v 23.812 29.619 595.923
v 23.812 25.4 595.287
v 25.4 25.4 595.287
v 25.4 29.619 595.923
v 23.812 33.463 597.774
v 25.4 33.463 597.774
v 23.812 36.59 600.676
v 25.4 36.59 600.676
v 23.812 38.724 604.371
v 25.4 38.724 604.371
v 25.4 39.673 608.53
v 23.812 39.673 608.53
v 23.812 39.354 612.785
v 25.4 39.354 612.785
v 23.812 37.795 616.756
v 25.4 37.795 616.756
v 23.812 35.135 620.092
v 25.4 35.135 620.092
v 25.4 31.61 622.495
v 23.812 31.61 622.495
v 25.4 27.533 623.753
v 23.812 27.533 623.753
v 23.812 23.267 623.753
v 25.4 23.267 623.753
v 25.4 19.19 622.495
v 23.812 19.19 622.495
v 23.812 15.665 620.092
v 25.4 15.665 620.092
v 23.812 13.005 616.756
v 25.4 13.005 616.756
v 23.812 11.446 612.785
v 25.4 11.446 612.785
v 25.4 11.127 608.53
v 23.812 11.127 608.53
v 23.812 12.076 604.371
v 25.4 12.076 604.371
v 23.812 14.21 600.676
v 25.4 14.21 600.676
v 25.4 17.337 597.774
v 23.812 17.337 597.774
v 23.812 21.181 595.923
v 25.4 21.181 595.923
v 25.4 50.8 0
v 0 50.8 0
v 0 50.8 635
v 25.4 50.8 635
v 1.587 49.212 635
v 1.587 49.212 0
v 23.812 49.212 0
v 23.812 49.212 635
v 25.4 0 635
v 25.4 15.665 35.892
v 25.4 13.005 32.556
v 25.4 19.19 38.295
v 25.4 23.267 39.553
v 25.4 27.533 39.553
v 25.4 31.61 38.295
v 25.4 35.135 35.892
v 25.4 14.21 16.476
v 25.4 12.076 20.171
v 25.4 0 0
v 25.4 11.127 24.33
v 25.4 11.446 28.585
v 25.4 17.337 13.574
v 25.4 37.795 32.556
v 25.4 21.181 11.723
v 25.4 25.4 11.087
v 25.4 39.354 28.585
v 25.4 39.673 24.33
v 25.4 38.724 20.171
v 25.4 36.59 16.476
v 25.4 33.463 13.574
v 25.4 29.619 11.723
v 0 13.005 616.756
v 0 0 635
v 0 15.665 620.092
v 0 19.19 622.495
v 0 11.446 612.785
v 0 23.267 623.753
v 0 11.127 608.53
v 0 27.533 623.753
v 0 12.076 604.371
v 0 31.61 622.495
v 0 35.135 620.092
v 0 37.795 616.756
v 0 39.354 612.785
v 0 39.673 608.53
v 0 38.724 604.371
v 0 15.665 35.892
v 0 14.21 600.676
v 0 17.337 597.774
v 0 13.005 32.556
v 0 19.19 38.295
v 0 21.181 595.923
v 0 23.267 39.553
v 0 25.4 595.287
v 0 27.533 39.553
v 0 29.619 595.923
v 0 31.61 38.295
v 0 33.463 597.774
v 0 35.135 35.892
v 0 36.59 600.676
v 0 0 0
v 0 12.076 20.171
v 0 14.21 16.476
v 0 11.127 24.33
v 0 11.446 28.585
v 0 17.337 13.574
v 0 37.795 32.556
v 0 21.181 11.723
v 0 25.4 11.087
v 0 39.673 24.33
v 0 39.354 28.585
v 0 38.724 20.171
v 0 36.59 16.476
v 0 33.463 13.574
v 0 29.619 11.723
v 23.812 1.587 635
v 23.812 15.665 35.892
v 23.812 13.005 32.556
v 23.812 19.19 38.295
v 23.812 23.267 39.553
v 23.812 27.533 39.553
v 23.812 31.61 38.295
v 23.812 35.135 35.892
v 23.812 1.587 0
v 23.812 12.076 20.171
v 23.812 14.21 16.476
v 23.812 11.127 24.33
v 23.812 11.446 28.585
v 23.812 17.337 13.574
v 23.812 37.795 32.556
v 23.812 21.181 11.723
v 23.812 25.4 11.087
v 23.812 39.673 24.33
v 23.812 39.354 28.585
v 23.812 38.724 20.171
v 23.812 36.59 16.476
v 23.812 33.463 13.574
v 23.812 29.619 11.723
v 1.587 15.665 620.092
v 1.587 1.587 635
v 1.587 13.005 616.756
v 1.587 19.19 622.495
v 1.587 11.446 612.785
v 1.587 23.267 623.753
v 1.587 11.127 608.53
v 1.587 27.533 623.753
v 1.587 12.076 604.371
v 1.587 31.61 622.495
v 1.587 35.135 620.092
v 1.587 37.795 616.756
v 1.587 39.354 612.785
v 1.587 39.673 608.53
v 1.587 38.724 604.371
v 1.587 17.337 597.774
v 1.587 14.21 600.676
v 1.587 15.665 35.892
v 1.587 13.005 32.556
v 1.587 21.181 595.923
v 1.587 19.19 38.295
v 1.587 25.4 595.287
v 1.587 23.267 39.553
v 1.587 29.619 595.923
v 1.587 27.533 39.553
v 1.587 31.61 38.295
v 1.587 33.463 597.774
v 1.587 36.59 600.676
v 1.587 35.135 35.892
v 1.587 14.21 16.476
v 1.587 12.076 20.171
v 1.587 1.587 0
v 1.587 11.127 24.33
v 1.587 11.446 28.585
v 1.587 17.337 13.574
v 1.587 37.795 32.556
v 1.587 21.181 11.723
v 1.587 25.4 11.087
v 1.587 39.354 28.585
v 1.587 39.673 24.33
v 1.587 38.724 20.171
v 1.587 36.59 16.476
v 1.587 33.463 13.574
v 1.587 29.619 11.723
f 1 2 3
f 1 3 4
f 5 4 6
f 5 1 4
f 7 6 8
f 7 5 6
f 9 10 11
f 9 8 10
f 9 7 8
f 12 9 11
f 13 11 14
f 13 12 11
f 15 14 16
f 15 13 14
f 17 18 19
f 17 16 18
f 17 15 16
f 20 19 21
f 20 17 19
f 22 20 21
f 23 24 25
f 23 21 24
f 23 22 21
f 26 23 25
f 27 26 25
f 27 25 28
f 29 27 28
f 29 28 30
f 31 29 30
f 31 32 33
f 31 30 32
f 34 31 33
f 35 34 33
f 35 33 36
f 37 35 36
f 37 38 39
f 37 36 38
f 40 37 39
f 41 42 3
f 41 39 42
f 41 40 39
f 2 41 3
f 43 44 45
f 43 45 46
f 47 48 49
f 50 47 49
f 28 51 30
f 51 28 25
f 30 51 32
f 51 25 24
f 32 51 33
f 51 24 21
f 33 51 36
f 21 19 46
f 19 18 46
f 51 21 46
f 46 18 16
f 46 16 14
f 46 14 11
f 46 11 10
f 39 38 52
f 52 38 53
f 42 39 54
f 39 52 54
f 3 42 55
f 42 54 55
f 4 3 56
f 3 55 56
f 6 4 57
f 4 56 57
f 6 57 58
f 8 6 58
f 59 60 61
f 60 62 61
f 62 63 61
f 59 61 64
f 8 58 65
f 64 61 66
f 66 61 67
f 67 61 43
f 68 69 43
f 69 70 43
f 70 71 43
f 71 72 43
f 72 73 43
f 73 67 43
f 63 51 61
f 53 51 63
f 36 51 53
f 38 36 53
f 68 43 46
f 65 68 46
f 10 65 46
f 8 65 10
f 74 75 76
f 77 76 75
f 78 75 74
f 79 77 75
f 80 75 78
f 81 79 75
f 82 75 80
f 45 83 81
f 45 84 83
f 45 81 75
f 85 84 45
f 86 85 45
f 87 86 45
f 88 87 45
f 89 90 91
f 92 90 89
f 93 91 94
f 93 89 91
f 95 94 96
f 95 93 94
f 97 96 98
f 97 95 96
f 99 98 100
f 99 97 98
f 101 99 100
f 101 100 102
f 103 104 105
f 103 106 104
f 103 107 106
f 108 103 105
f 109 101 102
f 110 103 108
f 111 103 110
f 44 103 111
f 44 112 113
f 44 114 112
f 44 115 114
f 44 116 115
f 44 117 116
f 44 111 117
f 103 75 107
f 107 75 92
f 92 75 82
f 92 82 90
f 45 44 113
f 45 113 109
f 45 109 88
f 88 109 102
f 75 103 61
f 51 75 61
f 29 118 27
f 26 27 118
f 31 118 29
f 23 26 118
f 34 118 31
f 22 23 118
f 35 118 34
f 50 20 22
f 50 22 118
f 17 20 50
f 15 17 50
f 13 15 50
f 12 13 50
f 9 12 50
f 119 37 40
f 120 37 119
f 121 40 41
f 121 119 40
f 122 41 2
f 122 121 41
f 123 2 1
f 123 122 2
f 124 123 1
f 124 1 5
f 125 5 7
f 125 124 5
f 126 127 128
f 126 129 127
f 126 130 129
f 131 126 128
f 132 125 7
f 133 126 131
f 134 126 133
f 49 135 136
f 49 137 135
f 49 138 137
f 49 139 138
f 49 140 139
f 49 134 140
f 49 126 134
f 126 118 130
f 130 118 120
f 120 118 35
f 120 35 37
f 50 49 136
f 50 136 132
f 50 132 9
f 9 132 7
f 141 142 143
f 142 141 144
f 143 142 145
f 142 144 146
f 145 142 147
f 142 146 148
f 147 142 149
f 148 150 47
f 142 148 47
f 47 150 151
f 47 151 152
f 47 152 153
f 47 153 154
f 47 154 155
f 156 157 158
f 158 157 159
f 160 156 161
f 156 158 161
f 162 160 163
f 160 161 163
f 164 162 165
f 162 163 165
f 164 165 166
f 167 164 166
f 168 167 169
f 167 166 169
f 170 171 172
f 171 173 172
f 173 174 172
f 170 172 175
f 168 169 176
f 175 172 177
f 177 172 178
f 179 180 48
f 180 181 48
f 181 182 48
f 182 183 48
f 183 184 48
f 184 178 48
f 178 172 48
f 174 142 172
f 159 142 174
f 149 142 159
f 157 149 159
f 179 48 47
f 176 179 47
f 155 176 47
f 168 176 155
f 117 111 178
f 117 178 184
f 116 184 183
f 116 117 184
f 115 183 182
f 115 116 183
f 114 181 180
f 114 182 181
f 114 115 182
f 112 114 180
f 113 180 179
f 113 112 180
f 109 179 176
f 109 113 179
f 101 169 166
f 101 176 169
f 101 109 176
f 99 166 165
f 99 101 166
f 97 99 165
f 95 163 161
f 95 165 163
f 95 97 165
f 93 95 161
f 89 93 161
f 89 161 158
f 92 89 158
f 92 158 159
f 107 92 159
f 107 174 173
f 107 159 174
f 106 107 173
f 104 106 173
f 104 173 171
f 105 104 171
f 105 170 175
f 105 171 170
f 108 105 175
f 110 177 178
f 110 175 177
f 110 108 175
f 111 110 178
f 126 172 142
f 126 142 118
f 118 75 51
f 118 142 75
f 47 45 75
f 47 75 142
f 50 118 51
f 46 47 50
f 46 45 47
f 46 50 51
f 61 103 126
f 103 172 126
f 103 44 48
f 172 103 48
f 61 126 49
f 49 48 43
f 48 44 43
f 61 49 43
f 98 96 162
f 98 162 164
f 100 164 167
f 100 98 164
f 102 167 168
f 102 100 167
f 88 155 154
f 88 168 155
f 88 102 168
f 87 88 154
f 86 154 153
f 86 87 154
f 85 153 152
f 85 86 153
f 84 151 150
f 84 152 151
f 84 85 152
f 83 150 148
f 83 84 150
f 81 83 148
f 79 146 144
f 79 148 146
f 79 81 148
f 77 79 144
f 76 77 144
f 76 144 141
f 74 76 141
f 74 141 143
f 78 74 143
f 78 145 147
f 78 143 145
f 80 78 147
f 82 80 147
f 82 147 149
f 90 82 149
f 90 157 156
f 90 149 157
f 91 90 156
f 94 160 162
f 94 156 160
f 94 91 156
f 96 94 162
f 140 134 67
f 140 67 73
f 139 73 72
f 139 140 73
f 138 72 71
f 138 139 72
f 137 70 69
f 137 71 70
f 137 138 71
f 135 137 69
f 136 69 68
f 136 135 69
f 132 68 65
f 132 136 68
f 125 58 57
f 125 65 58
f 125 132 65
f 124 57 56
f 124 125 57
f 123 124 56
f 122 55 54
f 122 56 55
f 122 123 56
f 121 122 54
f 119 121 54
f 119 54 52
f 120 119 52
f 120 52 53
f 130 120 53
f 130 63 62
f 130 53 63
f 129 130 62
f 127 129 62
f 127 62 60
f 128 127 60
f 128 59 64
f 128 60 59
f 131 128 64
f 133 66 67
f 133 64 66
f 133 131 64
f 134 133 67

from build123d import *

# Parameters (mm, degrees)
SKETCH1_W               = 25.4
SKETCH1_H               = 50.8
SKETCH1_W_2             = 22.225
SKETCH1_H_2             = 47.625
BOSS_EXTRUDE1_DEPTH     = 635
CUT_EXTRUDE1_DEPTH      = 638.534940219
CUT_EXTRUDE1_DEPTH_BACK = 638.534940219
SKETCH2_R               = 14.3129


with BuildPart() as part:
    # Sketch1 → Boss-Extrude1 (new body)
    with BuildSketch(Plane.XY):
        with Locations((12.7, 25.4)):
            Rectangle(SKETCH1_W, SKETCH1_H)
        with Locations((12.7, 25.4)):
            Rectangle(SKETCH1_W_2, SKETCH1_H_2, mode=Mode.SUBTRACT)
    extrude(amount=BOSS_EXTRUDE1_DEPTH)

    # Sketch2 → Cut-Extrude1 (cut, two sides: drawn at the far end of the back side and taken through both)
    with BuildSketch(Plane(origin=(25.4, 0, 0), x_dir=(0, 0, -1), z_dir=(1, 0, 0)).offset(-CUT_EXTRUDE1_DEPTH_BACK)):
        with Locations((-25.4, 25.4)):
            Circle(SKETCH2_R)
        with Locations((-609.6, 25.4)):
            Circle(SKETCH2_R)
    extrude(amount=CUT_EXTRUDE1_DEPTH + CUT_EXTRUDE1_DEPTH_BACK, mode=Mode.SUBTRACT)


solid = part.part
